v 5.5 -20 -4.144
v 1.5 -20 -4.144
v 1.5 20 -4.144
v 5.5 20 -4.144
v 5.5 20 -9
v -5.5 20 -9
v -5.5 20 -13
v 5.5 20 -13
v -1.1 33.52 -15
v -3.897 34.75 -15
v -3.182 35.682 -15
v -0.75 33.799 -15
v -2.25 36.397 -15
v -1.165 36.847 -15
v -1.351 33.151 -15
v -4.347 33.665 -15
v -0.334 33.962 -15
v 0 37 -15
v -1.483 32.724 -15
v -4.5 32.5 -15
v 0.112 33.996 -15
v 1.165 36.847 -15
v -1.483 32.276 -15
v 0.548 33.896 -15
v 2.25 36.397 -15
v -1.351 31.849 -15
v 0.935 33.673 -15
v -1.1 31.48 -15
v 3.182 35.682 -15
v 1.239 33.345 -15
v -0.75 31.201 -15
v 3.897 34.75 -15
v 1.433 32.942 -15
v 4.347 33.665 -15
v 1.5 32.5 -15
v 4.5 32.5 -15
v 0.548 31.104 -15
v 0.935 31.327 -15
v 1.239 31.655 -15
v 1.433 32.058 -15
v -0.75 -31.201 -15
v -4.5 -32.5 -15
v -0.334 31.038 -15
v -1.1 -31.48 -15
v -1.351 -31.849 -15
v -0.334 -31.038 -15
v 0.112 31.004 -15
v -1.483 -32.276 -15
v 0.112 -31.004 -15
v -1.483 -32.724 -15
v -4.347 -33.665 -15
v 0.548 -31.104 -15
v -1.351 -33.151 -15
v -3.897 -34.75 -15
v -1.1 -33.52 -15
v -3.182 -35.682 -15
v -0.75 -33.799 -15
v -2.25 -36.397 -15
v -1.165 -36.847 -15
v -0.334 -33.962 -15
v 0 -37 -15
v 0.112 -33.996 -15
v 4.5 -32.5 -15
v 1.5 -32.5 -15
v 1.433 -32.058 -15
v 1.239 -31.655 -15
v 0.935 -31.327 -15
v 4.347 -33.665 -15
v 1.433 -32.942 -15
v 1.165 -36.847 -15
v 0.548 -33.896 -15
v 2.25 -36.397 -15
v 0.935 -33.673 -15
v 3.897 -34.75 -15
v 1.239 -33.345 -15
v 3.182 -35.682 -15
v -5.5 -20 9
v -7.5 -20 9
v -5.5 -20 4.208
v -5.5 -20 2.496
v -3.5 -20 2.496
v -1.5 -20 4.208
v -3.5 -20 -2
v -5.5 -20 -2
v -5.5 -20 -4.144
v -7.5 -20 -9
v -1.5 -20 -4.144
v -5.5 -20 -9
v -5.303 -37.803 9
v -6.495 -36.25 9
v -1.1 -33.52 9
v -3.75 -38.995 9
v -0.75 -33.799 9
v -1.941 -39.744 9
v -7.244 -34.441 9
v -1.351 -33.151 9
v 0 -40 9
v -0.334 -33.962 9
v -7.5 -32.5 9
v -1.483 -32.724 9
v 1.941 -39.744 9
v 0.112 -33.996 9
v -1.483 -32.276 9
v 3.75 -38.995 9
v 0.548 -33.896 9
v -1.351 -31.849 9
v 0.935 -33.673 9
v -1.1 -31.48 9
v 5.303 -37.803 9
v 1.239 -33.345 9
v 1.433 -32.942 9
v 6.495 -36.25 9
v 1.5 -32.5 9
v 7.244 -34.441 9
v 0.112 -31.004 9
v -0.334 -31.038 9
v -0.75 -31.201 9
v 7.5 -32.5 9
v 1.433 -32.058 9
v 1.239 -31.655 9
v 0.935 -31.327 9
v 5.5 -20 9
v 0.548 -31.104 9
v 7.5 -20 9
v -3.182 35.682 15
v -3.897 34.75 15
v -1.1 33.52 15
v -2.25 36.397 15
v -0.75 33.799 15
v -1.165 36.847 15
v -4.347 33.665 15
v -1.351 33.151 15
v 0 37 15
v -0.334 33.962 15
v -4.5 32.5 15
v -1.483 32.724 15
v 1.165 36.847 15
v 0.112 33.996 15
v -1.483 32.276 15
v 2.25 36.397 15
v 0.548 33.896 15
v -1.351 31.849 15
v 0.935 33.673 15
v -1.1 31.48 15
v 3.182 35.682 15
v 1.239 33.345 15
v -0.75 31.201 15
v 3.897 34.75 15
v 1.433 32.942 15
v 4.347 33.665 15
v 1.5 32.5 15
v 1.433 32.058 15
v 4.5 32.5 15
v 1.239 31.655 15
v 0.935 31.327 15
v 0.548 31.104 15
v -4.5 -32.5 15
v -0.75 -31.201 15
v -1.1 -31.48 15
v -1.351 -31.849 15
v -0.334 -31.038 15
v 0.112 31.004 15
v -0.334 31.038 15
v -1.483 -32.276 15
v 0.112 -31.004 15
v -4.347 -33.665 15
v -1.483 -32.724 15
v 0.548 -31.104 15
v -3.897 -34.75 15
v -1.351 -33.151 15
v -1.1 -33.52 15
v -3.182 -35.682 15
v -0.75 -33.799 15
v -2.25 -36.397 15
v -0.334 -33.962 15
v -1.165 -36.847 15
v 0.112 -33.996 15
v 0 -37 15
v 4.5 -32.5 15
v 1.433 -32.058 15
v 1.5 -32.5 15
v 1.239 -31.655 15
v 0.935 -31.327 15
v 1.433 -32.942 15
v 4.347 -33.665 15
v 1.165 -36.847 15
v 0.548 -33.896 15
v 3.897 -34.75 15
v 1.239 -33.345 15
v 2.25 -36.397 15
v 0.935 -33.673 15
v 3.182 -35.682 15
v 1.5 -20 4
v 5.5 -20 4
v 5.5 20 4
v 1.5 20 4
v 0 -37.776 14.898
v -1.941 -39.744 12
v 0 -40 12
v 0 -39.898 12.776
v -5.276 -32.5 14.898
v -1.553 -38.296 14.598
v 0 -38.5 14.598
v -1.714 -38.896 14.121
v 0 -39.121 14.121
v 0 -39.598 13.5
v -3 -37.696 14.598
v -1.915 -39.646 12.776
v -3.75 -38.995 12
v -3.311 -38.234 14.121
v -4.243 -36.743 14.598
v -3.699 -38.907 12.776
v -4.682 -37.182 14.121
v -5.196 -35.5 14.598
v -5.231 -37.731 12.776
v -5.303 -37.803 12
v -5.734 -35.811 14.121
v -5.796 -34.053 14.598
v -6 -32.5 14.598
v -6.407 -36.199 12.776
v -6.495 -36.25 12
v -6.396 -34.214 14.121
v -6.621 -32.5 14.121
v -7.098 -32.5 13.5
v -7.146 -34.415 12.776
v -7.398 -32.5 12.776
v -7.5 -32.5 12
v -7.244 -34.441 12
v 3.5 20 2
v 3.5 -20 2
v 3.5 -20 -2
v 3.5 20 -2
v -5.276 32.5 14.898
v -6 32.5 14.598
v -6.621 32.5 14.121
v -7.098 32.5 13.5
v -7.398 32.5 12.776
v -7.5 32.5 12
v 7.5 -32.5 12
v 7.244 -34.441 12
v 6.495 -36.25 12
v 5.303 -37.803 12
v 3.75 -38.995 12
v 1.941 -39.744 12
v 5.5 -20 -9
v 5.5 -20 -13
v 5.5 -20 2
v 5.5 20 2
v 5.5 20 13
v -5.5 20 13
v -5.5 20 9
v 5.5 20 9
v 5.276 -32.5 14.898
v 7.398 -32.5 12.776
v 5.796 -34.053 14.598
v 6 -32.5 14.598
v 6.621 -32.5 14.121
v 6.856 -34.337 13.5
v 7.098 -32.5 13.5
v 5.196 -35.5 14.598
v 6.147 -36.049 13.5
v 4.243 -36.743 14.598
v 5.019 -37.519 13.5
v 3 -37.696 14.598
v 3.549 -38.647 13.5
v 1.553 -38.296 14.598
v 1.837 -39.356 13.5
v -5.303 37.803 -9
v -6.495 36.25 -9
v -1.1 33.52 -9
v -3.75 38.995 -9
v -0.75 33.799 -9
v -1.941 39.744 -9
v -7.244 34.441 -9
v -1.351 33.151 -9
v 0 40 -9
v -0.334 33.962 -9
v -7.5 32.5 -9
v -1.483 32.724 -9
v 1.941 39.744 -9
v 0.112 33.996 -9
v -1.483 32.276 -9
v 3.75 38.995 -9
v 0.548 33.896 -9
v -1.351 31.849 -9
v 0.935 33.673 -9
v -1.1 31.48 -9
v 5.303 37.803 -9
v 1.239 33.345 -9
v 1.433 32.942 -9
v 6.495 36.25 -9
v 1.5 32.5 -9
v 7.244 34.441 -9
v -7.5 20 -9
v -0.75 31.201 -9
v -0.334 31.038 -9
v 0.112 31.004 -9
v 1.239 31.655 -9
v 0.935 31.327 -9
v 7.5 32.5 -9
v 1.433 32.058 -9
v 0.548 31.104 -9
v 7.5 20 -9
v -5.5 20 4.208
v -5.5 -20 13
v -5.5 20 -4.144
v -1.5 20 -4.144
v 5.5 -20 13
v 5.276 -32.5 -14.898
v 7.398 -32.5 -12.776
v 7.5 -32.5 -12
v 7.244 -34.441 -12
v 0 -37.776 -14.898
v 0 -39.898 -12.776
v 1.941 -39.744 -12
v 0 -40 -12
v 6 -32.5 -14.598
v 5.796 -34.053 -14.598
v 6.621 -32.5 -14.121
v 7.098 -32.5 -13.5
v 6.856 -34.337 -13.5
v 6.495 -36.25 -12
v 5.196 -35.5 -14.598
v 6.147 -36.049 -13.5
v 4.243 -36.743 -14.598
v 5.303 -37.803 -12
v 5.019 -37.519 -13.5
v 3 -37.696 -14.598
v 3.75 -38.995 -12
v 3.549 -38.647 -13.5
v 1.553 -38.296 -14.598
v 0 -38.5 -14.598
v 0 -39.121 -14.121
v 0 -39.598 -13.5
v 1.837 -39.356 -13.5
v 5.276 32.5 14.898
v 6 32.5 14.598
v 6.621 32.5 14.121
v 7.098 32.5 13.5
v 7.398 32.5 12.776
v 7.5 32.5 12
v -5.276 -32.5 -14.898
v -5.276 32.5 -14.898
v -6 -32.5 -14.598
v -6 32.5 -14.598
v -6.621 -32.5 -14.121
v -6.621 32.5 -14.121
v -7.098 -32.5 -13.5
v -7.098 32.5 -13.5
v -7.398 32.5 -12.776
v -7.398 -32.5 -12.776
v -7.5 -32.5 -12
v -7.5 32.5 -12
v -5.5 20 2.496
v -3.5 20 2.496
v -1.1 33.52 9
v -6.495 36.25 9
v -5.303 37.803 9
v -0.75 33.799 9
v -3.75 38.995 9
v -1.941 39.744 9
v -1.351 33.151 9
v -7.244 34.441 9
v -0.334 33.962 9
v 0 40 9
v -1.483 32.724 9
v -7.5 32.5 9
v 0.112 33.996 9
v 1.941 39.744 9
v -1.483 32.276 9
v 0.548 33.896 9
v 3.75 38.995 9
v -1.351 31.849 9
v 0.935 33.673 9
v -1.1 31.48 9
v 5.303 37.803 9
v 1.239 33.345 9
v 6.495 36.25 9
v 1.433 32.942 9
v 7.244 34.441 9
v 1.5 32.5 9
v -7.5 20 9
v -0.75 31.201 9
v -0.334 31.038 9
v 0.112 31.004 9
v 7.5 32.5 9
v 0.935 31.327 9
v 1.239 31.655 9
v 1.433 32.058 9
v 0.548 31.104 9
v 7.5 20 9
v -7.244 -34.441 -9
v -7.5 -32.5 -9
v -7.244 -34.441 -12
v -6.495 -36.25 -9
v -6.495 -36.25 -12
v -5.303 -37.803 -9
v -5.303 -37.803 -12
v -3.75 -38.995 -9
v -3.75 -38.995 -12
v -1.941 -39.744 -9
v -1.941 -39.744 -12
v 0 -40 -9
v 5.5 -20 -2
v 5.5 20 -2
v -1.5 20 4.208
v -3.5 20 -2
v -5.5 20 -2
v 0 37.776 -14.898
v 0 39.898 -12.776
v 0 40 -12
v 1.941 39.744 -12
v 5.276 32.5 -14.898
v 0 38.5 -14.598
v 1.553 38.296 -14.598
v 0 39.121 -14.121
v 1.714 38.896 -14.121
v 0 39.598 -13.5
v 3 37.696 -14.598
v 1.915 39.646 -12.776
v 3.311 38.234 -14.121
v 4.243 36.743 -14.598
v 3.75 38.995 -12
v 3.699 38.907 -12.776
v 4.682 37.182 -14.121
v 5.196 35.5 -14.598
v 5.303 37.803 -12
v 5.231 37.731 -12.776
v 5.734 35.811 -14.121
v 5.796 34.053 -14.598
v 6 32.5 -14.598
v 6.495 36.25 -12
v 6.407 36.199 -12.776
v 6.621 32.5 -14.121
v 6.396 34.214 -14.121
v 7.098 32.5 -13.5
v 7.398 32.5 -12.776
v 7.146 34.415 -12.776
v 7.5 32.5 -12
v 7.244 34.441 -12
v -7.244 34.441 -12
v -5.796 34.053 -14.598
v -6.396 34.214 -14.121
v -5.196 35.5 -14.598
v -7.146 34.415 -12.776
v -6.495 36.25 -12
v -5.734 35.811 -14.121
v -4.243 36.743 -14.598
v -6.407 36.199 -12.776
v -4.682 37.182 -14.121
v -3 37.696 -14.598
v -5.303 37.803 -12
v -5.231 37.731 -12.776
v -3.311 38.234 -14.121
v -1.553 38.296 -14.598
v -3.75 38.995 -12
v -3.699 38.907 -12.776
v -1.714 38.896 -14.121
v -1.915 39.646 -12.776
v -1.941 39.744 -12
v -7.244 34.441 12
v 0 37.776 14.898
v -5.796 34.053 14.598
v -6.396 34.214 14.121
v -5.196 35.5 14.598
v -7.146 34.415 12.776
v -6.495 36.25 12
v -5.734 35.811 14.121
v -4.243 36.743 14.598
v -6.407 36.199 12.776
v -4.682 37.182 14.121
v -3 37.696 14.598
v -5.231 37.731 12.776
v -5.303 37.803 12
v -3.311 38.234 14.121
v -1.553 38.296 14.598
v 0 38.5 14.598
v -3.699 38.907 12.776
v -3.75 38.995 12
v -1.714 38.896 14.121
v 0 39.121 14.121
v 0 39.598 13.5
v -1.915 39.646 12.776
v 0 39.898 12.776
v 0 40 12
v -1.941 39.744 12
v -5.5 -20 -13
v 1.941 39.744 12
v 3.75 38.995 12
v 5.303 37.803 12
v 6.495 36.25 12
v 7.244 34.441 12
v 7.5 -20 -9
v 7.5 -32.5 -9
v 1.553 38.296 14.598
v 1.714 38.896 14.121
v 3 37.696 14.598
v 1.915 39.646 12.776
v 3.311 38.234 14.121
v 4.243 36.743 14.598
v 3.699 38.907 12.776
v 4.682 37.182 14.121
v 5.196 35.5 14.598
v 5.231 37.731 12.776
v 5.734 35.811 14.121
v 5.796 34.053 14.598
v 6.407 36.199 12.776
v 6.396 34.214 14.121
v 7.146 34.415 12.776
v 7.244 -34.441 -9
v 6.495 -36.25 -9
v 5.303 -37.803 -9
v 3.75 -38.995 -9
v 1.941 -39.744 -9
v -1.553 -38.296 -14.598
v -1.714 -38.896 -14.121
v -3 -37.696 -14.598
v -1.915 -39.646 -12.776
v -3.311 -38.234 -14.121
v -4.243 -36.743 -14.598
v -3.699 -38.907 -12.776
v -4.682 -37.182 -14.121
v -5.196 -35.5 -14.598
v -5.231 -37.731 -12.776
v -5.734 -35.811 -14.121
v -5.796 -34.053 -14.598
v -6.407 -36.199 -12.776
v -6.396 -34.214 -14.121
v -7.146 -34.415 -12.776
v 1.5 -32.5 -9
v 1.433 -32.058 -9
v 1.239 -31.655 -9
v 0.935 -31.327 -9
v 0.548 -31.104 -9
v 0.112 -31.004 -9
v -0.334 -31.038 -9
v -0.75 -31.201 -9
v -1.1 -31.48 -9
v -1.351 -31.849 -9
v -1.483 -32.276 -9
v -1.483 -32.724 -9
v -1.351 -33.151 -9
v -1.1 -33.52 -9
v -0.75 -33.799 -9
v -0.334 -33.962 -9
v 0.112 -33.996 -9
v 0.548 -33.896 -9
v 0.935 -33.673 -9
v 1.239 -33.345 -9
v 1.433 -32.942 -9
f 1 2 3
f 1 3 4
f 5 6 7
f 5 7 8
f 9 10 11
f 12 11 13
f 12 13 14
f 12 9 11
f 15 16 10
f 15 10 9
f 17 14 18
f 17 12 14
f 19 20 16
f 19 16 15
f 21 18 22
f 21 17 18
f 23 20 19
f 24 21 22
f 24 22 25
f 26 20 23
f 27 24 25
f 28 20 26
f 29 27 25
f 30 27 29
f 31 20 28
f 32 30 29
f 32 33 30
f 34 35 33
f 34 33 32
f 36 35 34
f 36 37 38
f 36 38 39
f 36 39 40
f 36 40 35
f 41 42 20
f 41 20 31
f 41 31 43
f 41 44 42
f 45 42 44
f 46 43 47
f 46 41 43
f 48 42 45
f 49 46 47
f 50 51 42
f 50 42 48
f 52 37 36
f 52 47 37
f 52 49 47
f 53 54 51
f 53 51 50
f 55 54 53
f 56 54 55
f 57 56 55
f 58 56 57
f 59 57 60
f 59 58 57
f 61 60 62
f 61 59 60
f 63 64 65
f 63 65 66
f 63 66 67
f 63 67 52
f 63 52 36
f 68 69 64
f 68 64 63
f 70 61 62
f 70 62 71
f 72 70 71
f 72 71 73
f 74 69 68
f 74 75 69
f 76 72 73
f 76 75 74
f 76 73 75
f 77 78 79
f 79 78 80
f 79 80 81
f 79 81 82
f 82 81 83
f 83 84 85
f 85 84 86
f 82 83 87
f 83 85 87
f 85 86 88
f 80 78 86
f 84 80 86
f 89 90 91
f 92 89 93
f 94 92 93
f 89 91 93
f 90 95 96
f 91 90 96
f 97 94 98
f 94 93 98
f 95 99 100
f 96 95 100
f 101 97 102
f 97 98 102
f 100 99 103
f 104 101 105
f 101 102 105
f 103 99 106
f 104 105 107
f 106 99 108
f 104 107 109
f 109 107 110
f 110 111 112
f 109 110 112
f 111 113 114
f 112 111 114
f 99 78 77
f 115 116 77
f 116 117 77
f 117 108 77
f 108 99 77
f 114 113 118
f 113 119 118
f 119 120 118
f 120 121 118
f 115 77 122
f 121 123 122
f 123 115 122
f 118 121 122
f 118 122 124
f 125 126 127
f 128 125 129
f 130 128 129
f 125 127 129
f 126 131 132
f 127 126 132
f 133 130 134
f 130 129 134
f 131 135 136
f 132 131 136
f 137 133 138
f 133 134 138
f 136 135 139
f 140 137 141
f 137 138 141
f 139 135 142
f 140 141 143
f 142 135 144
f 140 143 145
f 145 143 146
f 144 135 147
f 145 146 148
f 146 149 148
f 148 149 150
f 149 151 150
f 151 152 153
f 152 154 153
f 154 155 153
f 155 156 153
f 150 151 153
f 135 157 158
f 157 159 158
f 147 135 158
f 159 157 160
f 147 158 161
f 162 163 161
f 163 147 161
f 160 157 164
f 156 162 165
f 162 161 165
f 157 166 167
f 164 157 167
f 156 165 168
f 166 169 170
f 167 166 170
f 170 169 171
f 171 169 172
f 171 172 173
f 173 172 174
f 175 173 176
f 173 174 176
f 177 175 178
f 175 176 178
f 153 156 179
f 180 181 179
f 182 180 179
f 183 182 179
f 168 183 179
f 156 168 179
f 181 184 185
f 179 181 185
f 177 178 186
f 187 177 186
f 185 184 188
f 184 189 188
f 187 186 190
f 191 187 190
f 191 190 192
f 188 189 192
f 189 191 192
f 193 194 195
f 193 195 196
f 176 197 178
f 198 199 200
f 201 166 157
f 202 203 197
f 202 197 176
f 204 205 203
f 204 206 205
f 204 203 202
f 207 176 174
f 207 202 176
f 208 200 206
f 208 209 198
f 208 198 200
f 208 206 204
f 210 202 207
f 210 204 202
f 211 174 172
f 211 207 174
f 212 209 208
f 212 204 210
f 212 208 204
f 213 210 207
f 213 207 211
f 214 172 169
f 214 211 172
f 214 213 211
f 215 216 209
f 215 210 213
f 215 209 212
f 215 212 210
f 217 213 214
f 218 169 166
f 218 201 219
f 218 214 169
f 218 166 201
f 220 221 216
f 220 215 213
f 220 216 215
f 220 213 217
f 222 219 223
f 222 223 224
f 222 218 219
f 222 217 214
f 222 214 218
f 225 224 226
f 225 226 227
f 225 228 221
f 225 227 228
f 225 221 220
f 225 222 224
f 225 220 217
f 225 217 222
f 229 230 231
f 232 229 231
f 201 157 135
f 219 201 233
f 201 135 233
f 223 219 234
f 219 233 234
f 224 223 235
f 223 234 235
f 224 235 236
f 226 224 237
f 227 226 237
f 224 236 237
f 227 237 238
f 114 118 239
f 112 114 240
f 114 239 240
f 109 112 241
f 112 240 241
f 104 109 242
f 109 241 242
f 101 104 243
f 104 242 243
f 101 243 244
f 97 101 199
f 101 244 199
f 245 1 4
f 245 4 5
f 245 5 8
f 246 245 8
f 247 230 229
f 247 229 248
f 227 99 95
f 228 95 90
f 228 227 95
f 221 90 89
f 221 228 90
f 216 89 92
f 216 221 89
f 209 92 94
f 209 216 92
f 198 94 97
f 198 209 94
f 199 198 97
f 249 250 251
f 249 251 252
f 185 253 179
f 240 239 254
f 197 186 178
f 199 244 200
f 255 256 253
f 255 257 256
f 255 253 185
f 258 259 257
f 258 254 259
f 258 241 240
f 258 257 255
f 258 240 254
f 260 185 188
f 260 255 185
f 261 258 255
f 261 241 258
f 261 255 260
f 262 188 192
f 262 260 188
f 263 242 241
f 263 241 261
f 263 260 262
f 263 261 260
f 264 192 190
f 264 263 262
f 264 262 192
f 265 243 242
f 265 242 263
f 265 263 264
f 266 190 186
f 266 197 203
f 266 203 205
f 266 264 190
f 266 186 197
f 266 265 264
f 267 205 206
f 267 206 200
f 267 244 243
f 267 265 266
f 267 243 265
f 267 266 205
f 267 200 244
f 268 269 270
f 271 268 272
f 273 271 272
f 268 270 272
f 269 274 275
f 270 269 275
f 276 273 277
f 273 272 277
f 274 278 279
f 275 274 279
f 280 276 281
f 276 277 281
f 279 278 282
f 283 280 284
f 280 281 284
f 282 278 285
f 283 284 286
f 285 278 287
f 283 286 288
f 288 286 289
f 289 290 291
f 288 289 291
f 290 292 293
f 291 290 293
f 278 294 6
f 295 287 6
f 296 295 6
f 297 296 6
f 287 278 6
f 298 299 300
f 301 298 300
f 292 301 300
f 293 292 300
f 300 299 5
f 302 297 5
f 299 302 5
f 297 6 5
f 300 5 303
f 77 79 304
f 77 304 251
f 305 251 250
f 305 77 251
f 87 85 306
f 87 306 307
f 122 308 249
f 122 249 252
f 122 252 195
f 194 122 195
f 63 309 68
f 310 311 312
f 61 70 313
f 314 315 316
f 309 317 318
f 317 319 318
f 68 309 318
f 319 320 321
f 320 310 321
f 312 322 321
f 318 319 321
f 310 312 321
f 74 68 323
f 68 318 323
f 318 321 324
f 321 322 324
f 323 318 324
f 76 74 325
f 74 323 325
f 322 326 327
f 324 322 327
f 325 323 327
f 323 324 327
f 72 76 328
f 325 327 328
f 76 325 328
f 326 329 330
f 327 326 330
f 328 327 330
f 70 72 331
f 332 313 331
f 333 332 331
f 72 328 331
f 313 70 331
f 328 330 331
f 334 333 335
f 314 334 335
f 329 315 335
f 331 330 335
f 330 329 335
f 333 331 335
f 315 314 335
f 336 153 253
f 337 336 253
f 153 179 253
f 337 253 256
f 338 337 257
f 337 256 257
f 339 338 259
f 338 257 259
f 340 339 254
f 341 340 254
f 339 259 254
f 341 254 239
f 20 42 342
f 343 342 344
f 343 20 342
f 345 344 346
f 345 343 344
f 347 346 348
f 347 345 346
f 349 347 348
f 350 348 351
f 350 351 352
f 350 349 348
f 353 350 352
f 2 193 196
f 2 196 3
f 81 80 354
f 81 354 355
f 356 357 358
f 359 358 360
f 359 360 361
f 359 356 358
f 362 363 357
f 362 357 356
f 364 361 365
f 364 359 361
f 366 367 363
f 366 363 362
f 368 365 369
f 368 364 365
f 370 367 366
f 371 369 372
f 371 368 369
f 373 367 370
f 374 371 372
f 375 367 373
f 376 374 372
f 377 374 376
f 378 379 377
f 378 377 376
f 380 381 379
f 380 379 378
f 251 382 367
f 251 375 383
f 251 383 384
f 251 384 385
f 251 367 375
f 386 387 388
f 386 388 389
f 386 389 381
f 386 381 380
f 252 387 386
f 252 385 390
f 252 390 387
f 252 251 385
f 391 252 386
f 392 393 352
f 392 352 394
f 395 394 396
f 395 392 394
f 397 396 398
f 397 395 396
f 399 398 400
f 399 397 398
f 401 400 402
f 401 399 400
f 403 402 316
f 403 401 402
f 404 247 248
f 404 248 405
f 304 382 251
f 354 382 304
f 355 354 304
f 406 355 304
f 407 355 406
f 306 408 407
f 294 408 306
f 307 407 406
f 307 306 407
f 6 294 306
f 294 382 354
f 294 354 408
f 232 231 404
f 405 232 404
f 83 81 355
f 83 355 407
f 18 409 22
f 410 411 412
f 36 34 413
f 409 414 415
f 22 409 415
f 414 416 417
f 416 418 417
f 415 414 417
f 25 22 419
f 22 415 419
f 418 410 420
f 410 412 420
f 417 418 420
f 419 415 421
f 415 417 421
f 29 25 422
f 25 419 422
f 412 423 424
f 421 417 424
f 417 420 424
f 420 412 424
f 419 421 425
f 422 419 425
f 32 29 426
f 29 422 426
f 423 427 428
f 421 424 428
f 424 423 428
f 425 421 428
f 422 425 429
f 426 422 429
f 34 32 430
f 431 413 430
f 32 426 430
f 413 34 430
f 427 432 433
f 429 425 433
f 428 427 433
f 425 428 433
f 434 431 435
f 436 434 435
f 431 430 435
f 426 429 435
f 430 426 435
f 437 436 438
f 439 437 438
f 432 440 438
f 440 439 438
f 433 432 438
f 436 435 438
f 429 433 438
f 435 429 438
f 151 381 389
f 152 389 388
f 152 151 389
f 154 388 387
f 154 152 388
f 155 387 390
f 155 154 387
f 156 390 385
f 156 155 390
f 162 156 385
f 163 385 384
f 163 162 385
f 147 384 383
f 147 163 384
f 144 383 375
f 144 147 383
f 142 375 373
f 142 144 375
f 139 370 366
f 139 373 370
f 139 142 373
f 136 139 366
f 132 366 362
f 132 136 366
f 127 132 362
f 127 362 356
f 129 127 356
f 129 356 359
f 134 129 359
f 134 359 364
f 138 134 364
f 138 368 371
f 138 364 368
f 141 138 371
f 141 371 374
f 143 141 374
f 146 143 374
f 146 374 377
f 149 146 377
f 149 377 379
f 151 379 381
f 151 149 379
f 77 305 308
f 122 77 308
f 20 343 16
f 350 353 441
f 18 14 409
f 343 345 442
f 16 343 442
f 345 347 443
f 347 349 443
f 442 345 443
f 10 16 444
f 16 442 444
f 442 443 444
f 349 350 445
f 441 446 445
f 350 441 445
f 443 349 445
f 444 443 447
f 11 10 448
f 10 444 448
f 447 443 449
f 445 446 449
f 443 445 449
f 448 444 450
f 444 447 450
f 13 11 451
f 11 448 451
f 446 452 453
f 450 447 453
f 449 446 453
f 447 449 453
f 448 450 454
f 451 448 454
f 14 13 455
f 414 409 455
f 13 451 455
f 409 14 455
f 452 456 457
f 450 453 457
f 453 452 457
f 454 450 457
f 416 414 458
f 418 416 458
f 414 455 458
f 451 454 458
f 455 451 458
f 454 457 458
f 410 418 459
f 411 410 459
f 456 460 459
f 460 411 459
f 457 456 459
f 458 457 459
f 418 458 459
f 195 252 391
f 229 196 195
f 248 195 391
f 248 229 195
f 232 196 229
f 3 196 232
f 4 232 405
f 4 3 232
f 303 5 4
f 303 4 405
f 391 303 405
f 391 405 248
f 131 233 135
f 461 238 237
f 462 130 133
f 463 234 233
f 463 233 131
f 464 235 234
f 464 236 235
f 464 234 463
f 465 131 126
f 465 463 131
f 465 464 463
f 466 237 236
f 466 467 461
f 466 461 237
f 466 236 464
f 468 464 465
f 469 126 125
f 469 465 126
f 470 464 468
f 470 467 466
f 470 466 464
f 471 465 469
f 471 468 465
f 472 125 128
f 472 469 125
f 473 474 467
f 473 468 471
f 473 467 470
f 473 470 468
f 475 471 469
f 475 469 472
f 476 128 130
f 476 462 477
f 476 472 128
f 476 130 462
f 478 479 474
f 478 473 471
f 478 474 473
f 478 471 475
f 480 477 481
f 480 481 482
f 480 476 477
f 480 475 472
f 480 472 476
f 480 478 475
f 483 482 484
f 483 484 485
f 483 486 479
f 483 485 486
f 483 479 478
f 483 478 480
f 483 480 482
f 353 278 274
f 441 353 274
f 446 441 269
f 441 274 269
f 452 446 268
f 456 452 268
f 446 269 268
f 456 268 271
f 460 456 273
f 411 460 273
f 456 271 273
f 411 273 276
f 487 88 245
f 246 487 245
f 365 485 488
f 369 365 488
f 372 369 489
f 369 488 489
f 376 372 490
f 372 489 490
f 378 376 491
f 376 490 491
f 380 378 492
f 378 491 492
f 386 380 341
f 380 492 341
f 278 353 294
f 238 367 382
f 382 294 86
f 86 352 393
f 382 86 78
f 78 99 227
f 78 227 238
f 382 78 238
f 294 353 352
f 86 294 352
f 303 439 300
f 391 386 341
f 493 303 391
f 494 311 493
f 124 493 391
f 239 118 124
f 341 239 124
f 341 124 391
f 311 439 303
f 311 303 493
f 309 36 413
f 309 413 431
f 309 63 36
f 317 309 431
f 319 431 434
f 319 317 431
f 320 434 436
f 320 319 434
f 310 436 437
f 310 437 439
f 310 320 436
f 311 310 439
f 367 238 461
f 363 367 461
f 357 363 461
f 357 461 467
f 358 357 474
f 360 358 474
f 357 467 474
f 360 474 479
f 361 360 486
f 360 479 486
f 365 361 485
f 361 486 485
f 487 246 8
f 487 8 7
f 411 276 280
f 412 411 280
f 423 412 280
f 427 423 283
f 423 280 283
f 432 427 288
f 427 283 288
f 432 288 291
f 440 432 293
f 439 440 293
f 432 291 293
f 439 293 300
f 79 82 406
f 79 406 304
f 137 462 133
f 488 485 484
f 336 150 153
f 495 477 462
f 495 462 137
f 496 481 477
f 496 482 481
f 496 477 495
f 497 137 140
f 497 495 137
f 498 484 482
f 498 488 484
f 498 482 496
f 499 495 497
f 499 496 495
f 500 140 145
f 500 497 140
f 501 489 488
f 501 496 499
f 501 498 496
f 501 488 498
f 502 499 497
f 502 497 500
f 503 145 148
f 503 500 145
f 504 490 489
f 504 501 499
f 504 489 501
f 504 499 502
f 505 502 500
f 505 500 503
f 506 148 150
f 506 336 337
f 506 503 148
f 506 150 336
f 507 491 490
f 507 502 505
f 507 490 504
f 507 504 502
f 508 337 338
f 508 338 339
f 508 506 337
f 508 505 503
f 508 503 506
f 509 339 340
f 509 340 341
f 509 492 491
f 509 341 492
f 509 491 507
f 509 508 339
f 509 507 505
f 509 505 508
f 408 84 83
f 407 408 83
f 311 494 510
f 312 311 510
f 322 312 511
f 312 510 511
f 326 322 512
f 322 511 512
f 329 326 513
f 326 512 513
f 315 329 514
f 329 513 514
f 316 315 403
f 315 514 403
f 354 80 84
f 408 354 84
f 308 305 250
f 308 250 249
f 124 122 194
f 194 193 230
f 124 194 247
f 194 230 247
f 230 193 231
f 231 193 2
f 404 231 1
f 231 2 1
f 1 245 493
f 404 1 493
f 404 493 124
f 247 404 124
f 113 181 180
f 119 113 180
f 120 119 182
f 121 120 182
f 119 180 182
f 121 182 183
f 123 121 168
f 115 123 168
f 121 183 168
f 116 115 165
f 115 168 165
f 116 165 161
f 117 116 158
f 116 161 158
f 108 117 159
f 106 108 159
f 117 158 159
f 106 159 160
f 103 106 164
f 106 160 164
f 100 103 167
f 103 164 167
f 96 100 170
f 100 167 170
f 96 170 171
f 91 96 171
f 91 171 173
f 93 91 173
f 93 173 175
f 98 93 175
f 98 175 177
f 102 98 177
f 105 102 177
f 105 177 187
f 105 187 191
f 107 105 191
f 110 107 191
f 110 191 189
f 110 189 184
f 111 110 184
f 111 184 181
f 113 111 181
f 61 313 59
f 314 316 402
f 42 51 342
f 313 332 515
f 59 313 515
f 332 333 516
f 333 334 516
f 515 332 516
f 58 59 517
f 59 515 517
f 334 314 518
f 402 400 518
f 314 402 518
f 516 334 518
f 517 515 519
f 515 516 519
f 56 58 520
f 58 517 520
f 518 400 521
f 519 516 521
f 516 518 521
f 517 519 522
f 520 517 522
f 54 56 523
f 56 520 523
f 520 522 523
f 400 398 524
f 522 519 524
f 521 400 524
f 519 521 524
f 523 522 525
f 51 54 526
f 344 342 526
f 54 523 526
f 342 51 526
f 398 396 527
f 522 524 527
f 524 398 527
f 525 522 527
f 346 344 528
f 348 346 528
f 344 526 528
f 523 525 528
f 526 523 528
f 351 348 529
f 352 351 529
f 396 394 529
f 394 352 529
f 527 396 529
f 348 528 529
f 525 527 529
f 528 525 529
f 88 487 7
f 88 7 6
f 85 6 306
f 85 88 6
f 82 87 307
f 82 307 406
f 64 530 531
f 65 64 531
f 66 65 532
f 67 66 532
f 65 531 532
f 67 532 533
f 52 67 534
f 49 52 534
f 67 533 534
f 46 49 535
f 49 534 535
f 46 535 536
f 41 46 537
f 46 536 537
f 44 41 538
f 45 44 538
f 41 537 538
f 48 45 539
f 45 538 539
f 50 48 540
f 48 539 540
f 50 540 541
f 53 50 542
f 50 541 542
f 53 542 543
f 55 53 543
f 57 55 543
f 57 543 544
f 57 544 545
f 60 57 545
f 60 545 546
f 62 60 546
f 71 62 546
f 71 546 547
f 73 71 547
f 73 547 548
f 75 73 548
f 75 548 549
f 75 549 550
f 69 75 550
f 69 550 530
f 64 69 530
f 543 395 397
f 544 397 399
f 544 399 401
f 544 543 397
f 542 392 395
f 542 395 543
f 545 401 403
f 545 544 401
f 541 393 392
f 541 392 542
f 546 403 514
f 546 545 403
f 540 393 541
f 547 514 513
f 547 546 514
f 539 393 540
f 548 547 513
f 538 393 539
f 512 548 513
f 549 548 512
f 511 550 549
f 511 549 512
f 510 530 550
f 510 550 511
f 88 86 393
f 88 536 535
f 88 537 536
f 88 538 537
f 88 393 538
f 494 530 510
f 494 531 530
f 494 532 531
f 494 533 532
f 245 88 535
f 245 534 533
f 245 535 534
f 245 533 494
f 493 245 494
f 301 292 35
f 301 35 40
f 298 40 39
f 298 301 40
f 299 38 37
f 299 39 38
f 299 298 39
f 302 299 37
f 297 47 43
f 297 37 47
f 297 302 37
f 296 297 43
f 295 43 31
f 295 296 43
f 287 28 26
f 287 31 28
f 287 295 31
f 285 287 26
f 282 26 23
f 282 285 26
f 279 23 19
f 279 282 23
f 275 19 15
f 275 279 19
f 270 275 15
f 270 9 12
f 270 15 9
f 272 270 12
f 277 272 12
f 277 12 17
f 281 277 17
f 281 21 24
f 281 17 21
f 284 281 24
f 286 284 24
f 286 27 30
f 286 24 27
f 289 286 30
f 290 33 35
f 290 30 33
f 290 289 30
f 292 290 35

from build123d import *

# Parameters (mm, degrees)
BOSS_EXTRUDE1_START  = -20
SKETCH1_W            = 15
SKETCH1_H            = 30
SKETCH1_W_2          = 2
SKETCH1_H_2          = 4.496327887
SKETCH1_H_3          = 4
BOSS_EXTRUDE1_DEPTH  = 40
SKETCH2_W            = 15
SKETCH2_H            = 6
BOSS_EXTRUDE2_DEPTH  = 20
FILLET1_R            = 7.5
SKETCH3_R            = 1.5
CUT_EXTRUDE1_DEPTH   = 51.55937104
FILLET1_OF_MIRROR1_R = 7.5
FILLET4_R            = 3


with BuildPart() as part:
    # Sketch1 → Boss-Extrude1 (new body)
    with BuildSketch(Plane(origin=(0, 0, 0), x_dir=(1, 0, 0), z_dir=(0, 1, 0)).offset(BOSS_EXTRUDE1_START)):
        Rectangle(SKETCH1_W, SKETCH1_H)
        Polygon((-5.5, -13), (5.5, -13), (5.5, -4), (1.5, -4), (1.5, 4.144450542), (5.5, 4.144450542), (5.5, 13), (-5.5, 13), (-5.5, 4.144450542), (-1.5, 4.144450542), (-1.5, -4.208461458), (-5.5, -4.208461458), align=None, mode=Mode.SUBTRACT)
        with Locations((-4.5, -0.248163944)):
            Rectangle(SKETCH1_W_2, SKETCH1_H_2, mode=Mode.SUBTRACT)
        with Locations((4.5, 0)):
            Rectangle(SKETCH1_W_2, SKETCH1_H_3, mode=Mode.SUBTRACT)
    extrude(amount=BOSS_EXTRUDE1_DEPTH)

    # Sketch2 → Boss-Extrude2 (add)
    with BuildSketch(Plane.XZ.offset(20)):
        with Locations((0, 12)):
            Rectangle(SKETCH2_W, SKETCH2_H)
        with Locations((0, -12)):
            Rectangle(SKETCH2_W, SKETCH2_H)
    boss_extrude2 = extrude(amount=BOSS_EXTRUDE2_DEPTH)

    # Fillet1
    fillet1_edges = [part.edges().sort_by_distance(p)[0] for p in [
        (-7.5, -40, 12),
        (-7.5, -40, -12),
        (7.5, -40, -12),
        (7.5, -40, 12),
    ]]
    fillet(fillet1_edges, radius=FILLET1_R - 0.0001)  # a hair under: the kernel refuses the full size

    # Sketch3 → Cut-Extrude1 (cut, through all)
    with BuildSketch(Plane.XY.offset(15)):
        with Locations((0, -32.5)):
            Circle(SKETCH3_R)
    cut_extrude1 = extrude(amount=-CUT_EXTRUDE1_DEPTH, mode=Mode.SUBTRACT)

    # Mirror1: Boss-Extrude2, Cut-Extrude1 across plane
    add(boss_extrude2.mirror(Plane.ZX))
    add(cut_extrude1.mirror(Plane.ZX), mode=Mode.SUBTRACT)

    # Fillet1 of Mirror1
    fillet1_of_mirror1_edges = [part.edges().sort_by_distance(p)[0] for p in [
        (-7.5, 40, 12),
        (-7.5, 40, -12),
        (7.5, 40, -12),
        (7.5, 40, 12),
    ]]
    fillet(fillet1_of_mirror1_edges, radius=FILLET1_OF_MIRROR1_R - 0.0001)  # a hair under: the kernel refuses the full size

    # Fillet4
    fillet4_edges = [part.edges().sort_by_distance(p)[0] for p in [
        (5.303330148, -37.803330148, 15),
        (-5.303330148, -37.803330148, 15),
        (5.303330148, -37.803330148, -15),
        (-5.303330148, -37.803330148, -15),
        (-7.5, 0, 15),
        (-7.5, 0, -15),
        (7.5, 0, 15),
        (5.303330148, 37.803330148, 15),
        (-5.303330148, 37.803330148, 15),
        (7.5, 0, -15),
        (5.303330148, 37.803330148, -15),
        (-5.303330148, 37.803330148, -15),
    ]]
    fillet(fillet4_edges, radius=FILLET4_R)


solid = part.part
